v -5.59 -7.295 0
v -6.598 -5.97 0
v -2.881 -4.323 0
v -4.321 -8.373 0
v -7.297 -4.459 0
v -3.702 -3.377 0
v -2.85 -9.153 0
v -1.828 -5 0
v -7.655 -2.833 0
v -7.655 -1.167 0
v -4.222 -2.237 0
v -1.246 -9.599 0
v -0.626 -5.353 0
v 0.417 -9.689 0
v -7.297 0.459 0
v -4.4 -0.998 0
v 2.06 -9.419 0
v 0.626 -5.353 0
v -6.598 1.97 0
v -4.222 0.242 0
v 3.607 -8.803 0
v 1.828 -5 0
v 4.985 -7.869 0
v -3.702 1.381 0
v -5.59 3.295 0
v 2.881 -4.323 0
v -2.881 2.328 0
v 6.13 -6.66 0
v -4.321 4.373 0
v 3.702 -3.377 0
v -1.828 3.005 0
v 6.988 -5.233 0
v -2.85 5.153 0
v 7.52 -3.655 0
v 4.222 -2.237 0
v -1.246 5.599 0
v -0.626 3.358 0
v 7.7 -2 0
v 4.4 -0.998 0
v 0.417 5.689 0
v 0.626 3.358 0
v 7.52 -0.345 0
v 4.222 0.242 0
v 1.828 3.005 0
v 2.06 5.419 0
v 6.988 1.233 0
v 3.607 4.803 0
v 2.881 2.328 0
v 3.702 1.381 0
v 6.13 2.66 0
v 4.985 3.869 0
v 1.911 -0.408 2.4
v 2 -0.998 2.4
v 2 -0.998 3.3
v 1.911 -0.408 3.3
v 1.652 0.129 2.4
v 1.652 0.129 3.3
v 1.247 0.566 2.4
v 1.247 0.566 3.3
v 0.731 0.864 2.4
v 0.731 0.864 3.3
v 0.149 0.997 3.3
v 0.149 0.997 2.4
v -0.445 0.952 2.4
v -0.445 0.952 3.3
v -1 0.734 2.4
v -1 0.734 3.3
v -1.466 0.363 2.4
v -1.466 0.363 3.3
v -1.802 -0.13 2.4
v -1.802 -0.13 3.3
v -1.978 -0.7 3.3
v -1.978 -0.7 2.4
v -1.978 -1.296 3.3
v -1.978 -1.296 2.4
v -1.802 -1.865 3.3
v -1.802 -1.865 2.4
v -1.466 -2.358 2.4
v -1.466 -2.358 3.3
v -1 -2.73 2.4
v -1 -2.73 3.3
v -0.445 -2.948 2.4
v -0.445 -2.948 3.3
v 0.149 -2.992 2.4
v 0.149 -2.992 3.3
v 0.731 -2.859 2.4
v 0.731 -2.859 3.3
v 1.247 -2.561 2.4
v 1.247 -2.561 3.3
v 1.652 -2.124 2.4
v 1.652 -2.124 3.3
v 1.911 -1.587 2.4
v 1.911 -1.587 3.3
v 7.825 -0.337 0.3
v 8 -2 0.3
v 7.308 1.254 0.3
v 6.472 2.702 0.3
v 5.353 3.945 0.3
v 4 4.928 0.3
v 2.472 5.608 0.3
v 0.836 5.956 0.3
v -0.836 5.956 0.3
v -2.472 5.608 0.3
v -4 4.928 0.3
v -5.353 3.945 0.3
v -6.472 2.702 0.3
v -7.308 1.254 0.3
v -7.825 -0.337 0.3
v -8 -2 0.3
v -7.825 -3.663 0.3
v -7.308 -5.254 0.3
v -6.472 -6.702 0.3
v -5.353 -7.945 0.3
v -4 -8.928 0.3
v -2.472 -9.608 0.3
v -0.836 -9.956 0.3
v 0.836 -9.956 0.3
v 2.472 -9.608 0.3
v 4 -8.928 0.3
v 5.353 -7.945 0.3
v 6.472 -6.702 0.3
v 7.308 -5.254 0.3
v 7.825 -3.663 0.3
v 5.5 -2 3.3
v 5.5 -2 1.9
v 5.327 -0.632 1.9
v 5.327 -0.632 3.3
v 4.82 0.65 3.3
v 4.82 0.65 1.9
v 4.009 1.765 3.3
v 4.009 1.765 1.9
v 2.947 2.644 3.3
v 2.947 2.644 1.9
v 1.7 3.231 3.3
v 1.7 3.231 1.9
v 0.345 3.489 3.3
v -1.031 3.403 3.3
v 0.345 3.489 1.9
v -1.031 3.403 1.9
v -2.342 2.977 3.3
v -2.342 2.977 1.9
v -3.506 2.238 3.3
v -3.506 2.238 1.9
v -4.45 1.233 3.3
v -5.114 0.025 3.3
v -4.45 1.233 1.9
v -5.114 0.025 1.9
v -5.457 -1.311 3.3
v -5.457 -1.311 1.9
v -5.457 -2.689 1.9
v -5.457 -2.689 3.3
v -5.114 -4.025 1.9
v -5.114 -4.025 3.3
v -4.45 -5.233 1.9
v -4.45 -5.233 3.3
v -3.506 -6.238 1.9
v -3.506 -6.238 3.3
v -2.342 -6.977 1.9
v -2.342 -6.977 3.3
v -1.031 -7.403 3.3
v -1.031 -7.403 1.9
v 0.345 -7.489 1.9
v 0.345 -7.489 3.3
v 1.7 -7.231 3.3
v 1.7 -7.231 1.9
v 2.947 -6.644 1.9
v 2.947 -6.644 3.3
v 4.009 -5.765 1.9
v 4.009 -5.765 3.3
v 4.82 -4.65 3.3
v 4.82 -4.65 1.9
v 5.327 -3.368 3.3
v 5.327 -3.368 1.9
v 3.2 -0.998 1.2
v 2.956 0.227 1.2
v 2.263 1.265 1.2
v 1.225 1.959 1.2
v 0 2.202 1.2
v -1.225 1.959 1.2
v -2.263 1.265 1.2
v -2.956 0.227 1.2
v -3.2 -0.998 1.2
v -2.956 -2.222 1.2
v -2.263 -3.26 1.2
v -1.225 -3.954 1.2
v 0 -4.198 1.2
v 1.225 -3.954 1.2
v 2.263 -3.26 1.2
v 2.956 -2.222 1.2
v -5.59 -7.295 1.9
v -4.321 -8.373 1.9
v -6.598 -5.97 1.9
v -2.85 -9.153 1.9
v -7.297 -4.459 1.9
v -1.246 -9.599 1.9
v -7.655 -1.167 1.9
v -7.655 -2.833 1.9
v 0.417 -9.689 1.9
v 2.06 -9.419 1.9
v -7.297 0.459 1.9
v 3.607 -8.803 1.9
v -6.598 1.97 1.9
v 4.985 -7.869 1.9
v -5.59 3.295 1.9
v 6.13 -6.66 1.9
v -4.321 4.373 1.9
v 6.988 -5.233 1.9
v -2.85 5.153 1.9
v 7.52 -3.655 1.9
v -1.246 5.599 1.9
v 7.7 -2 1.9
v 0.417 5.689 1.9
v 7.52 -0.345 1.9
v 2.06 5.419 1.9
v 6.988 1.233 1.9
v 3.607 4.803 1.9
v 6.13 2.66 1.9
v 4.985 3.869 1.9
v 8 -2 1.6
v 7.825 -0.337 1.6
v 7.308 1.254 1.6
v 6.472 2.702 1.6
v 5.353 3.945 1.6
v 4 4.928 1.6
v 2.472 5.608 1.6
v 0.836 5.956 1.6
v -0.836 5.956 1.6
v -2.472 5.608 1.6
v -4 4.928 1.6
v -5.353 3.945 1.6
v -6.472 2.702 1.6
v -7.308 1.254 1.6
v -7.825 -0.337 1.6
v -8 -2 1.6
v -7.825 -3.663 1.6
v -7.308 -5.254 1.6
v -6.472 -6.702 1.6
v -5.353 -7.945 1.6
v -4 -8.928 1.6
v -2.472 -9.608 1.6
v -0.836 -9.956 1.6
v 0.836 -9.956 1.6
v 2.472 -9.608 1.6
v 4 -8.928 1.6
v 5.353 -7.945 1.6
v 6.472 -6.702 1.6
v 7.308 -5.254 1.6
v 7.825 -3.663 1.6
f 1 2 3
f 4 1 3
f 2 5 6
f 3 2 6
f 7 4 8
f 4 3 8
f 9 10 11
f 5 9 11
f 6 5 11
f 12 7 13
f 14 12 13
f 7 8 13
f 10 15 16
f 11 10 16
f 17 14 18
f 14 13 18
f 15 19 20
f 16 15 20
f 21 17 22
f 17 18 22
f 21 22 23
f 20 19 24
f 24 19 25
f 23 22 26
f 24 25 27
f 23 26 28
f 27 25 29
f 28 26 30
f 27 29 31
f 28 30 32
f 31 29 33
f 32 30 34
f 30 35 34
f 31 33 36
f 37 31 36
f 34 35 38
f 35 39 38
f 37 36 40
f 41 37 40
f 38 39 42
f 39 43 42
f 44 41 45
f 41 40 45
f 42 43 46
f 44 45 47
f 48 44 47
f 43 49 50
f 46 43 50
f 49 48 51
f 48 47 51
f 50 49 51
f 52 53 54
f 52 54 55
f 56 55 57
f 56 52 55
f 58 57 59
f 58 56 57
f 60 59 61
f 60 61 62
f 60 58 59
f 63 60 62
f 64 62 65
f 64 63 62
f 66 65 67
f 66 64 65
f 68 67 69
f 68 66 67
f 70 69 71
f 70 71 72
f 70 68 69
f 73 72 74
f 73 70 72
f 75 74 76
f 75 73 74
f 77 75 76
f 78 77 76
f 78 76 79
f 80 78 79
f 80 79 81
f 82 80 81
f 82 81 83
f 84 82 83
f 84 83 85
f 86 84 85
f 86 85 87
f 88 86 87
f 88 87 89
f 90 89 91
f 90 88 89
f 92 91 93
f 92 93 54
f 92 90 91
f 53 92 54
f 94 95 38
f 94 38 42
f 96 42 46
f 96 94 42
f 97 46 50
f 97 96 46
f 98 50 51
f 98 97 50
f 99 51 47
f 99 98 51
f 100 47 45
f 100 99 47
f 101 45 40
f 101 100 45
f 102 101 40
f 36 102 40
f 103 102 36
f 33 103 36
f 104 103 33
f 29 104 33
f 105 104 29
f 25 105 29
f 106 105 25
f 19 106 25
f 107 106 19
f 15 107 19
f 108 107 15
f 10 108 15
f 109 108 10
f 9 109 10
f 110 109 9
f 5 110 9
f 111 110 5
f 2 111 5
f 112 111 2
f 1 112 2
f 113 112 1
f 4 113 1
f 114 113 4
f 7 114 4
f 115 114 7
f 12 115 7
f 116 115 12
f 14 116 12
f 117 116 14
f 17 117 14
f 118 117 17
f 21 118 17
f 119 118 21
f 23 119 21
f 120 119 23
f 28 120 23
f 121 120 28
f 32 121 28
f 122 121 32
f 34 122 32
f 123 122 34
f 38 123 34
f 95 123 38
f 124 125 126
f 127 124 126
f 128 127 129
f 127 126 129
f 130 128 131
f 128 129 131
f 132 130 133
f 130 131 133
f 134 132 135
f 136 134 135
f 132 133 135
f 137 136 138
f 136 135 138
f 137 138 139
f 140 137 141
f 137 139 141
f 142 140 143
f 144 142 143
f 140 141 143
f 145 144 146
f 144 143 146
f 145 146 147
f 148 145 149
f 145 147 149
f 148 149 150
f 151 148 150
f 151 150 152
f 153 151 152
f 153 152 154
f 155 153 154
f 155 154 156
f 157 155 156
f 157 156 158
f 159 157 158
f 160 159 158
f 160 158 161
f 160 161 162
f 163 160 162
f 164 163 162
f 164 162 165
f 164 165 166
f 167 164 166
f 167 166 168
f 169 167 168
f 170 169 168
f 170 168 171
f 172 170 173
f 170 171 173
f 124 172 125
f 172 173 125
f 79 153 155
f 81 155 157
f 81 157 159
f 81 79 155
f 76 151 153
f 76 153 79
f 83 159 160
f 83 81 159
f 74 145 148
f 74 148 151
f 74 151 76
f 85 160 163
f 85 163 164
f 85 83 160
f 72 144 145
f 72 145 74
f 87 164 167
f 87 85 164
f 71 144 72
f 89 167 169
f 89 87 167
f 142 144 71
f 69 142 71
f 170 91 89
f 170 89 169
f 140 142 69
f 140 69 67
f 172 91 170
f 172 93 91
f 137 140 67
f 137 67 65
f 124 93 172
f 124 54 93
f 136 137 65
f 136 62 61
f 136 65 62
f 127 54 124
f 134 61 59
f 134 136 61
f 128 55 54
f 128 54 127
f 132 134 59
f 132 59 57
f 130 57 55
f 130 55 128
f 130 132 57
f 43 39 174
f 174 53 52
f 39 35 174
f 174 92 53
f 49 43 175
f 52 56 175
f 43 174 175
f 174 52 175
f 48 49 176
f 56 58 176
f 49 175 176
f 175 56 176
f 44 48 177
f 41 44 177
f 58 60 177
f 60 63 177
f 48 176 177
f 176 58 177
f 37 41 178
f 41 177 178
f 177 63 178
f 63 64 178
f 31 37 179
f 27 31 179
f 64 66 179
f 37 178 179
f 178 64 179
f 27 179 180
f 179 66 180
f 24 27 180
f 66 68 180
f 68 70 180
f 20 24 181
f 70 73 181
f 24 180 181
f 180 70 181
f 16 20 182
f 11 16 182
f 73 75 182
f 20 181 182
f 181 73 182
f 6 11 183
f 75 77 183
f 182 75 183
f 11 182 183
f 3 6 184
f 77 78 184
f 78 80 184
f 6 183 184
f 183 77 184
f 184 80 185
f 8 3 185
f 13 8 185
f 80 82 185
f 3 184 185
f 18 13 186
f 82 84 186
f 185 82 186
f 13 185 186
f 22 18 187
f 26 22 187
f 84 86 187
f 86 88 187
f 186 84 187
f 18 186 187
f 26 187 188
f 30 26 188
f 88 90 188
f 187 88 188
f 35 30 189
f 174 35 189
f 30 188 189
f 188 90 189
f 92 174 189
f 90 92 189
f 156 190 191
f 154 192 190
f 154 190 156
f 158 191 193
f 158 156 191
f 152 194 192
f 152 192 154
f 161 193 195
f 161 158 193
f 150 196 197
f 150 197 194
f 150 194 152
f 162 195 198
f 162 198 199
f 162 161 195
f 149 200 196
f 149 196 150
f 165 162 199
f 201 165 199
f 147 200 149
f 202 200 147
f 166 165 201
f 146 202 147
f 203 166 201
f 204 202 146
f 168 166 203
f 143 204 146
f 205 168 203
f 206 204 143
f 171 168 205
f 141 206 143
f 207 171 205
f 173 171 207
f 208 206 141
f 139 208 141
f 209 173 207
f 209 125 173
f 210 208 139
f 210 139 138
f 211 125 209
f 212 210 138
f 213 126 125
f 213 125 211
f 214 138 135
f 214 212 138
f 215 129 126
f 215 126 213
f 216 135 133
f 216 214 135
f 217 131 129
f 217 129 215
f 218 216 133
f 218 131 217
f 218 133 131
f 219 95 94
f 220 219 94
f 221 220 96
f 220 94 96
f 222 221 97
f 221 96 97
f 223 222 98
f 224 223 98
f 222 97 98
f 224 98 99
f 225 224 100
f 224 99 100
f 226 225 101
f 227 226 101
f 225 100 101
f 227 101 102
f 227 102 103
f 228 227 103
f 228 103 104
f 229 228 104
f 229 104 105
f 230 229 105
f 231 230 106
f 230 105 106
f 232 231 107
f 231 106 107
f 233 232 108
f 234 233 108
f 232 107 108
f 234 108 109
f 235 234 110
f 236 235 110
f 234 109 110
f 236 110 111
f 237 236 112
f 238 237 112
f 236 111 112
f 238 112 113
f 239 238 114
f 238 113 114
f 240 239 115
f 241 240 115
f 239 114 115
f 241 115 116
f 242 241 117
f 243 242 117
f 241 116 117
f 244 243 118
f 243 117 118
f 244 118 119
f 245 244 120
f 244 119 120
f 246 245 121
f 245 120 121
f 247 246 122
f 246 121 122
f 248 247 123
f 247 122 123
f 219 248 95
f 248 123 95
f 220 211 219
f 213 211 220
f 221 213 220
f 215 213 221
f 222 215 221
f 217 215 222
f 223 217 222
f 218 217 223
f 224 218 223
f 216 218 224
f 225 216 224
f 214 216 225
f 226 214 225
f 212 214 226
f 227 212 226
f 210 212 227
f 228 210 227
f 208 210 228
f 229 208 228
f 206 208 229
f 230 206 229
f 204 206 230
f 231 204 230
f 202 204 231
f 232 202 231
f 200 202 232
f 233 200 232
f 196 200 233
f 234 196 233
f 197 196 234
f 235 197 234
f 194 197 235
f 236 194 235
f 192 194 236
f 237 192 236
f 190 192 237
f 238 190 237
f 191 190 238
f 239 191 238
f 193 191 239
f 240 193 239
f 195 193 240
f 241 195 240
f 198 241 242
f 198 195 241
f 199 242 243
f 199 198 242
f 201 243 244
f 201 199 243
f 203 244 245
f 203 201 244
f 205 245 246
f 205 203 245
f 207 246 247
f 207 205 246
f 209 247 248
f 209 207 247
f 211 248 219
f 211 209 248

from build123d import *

# Parameters (mm, degrees)
F0_R     = 5.5
F0_R_2   = 2
F1_DEPTH = 3.3
F0_R_3   = 8
F2_DEPTH = 1.9
F3_SIZE  = 2.4
F4_SIZE  = 0.3


# Not quite as in the source:
# - a feature names something its author has since deleted; it is built from what else it names


with BuildPart() as f1:
    # F0 (on Top) → F1 (new body)
    with BuildSketch(Plane.XY):
        with Locations((0, -2)):
            Circle(F0_R)
        with Locations((0, -0.9976860601)):
            Circle(F0_R_2, mode=Mode.SUBTRACT)
    extrude(amount=F1_DEPTH)

    # F0 (on Top) → F2 (join)
    with BuildSketch(Plane.XY):
        with Locations((0, -2)):
            Circle(F0_R_3)
        with Locations((0, -2)):
            Circle(F0_R, mode=Mode.SUBTRACT)
    extrude(amount=F2_DEPTH)

    # F3
    f3_edges = [f1.edges().sort_by_distance(p)[0] for p in [
        (-2, -0.997686, 0),
    ]]
    chamfer(f3_edges, length=F3_SIZE)

    # F4
    f4_edges = [f1.edges().sort_by_distance(p)[0] for p in [
        (-8, -2, 1.9),
        (-8, -2, 0),
    ]]
    chamfer(f4_edges, length=F4_SIZE)


solid = f1.part
